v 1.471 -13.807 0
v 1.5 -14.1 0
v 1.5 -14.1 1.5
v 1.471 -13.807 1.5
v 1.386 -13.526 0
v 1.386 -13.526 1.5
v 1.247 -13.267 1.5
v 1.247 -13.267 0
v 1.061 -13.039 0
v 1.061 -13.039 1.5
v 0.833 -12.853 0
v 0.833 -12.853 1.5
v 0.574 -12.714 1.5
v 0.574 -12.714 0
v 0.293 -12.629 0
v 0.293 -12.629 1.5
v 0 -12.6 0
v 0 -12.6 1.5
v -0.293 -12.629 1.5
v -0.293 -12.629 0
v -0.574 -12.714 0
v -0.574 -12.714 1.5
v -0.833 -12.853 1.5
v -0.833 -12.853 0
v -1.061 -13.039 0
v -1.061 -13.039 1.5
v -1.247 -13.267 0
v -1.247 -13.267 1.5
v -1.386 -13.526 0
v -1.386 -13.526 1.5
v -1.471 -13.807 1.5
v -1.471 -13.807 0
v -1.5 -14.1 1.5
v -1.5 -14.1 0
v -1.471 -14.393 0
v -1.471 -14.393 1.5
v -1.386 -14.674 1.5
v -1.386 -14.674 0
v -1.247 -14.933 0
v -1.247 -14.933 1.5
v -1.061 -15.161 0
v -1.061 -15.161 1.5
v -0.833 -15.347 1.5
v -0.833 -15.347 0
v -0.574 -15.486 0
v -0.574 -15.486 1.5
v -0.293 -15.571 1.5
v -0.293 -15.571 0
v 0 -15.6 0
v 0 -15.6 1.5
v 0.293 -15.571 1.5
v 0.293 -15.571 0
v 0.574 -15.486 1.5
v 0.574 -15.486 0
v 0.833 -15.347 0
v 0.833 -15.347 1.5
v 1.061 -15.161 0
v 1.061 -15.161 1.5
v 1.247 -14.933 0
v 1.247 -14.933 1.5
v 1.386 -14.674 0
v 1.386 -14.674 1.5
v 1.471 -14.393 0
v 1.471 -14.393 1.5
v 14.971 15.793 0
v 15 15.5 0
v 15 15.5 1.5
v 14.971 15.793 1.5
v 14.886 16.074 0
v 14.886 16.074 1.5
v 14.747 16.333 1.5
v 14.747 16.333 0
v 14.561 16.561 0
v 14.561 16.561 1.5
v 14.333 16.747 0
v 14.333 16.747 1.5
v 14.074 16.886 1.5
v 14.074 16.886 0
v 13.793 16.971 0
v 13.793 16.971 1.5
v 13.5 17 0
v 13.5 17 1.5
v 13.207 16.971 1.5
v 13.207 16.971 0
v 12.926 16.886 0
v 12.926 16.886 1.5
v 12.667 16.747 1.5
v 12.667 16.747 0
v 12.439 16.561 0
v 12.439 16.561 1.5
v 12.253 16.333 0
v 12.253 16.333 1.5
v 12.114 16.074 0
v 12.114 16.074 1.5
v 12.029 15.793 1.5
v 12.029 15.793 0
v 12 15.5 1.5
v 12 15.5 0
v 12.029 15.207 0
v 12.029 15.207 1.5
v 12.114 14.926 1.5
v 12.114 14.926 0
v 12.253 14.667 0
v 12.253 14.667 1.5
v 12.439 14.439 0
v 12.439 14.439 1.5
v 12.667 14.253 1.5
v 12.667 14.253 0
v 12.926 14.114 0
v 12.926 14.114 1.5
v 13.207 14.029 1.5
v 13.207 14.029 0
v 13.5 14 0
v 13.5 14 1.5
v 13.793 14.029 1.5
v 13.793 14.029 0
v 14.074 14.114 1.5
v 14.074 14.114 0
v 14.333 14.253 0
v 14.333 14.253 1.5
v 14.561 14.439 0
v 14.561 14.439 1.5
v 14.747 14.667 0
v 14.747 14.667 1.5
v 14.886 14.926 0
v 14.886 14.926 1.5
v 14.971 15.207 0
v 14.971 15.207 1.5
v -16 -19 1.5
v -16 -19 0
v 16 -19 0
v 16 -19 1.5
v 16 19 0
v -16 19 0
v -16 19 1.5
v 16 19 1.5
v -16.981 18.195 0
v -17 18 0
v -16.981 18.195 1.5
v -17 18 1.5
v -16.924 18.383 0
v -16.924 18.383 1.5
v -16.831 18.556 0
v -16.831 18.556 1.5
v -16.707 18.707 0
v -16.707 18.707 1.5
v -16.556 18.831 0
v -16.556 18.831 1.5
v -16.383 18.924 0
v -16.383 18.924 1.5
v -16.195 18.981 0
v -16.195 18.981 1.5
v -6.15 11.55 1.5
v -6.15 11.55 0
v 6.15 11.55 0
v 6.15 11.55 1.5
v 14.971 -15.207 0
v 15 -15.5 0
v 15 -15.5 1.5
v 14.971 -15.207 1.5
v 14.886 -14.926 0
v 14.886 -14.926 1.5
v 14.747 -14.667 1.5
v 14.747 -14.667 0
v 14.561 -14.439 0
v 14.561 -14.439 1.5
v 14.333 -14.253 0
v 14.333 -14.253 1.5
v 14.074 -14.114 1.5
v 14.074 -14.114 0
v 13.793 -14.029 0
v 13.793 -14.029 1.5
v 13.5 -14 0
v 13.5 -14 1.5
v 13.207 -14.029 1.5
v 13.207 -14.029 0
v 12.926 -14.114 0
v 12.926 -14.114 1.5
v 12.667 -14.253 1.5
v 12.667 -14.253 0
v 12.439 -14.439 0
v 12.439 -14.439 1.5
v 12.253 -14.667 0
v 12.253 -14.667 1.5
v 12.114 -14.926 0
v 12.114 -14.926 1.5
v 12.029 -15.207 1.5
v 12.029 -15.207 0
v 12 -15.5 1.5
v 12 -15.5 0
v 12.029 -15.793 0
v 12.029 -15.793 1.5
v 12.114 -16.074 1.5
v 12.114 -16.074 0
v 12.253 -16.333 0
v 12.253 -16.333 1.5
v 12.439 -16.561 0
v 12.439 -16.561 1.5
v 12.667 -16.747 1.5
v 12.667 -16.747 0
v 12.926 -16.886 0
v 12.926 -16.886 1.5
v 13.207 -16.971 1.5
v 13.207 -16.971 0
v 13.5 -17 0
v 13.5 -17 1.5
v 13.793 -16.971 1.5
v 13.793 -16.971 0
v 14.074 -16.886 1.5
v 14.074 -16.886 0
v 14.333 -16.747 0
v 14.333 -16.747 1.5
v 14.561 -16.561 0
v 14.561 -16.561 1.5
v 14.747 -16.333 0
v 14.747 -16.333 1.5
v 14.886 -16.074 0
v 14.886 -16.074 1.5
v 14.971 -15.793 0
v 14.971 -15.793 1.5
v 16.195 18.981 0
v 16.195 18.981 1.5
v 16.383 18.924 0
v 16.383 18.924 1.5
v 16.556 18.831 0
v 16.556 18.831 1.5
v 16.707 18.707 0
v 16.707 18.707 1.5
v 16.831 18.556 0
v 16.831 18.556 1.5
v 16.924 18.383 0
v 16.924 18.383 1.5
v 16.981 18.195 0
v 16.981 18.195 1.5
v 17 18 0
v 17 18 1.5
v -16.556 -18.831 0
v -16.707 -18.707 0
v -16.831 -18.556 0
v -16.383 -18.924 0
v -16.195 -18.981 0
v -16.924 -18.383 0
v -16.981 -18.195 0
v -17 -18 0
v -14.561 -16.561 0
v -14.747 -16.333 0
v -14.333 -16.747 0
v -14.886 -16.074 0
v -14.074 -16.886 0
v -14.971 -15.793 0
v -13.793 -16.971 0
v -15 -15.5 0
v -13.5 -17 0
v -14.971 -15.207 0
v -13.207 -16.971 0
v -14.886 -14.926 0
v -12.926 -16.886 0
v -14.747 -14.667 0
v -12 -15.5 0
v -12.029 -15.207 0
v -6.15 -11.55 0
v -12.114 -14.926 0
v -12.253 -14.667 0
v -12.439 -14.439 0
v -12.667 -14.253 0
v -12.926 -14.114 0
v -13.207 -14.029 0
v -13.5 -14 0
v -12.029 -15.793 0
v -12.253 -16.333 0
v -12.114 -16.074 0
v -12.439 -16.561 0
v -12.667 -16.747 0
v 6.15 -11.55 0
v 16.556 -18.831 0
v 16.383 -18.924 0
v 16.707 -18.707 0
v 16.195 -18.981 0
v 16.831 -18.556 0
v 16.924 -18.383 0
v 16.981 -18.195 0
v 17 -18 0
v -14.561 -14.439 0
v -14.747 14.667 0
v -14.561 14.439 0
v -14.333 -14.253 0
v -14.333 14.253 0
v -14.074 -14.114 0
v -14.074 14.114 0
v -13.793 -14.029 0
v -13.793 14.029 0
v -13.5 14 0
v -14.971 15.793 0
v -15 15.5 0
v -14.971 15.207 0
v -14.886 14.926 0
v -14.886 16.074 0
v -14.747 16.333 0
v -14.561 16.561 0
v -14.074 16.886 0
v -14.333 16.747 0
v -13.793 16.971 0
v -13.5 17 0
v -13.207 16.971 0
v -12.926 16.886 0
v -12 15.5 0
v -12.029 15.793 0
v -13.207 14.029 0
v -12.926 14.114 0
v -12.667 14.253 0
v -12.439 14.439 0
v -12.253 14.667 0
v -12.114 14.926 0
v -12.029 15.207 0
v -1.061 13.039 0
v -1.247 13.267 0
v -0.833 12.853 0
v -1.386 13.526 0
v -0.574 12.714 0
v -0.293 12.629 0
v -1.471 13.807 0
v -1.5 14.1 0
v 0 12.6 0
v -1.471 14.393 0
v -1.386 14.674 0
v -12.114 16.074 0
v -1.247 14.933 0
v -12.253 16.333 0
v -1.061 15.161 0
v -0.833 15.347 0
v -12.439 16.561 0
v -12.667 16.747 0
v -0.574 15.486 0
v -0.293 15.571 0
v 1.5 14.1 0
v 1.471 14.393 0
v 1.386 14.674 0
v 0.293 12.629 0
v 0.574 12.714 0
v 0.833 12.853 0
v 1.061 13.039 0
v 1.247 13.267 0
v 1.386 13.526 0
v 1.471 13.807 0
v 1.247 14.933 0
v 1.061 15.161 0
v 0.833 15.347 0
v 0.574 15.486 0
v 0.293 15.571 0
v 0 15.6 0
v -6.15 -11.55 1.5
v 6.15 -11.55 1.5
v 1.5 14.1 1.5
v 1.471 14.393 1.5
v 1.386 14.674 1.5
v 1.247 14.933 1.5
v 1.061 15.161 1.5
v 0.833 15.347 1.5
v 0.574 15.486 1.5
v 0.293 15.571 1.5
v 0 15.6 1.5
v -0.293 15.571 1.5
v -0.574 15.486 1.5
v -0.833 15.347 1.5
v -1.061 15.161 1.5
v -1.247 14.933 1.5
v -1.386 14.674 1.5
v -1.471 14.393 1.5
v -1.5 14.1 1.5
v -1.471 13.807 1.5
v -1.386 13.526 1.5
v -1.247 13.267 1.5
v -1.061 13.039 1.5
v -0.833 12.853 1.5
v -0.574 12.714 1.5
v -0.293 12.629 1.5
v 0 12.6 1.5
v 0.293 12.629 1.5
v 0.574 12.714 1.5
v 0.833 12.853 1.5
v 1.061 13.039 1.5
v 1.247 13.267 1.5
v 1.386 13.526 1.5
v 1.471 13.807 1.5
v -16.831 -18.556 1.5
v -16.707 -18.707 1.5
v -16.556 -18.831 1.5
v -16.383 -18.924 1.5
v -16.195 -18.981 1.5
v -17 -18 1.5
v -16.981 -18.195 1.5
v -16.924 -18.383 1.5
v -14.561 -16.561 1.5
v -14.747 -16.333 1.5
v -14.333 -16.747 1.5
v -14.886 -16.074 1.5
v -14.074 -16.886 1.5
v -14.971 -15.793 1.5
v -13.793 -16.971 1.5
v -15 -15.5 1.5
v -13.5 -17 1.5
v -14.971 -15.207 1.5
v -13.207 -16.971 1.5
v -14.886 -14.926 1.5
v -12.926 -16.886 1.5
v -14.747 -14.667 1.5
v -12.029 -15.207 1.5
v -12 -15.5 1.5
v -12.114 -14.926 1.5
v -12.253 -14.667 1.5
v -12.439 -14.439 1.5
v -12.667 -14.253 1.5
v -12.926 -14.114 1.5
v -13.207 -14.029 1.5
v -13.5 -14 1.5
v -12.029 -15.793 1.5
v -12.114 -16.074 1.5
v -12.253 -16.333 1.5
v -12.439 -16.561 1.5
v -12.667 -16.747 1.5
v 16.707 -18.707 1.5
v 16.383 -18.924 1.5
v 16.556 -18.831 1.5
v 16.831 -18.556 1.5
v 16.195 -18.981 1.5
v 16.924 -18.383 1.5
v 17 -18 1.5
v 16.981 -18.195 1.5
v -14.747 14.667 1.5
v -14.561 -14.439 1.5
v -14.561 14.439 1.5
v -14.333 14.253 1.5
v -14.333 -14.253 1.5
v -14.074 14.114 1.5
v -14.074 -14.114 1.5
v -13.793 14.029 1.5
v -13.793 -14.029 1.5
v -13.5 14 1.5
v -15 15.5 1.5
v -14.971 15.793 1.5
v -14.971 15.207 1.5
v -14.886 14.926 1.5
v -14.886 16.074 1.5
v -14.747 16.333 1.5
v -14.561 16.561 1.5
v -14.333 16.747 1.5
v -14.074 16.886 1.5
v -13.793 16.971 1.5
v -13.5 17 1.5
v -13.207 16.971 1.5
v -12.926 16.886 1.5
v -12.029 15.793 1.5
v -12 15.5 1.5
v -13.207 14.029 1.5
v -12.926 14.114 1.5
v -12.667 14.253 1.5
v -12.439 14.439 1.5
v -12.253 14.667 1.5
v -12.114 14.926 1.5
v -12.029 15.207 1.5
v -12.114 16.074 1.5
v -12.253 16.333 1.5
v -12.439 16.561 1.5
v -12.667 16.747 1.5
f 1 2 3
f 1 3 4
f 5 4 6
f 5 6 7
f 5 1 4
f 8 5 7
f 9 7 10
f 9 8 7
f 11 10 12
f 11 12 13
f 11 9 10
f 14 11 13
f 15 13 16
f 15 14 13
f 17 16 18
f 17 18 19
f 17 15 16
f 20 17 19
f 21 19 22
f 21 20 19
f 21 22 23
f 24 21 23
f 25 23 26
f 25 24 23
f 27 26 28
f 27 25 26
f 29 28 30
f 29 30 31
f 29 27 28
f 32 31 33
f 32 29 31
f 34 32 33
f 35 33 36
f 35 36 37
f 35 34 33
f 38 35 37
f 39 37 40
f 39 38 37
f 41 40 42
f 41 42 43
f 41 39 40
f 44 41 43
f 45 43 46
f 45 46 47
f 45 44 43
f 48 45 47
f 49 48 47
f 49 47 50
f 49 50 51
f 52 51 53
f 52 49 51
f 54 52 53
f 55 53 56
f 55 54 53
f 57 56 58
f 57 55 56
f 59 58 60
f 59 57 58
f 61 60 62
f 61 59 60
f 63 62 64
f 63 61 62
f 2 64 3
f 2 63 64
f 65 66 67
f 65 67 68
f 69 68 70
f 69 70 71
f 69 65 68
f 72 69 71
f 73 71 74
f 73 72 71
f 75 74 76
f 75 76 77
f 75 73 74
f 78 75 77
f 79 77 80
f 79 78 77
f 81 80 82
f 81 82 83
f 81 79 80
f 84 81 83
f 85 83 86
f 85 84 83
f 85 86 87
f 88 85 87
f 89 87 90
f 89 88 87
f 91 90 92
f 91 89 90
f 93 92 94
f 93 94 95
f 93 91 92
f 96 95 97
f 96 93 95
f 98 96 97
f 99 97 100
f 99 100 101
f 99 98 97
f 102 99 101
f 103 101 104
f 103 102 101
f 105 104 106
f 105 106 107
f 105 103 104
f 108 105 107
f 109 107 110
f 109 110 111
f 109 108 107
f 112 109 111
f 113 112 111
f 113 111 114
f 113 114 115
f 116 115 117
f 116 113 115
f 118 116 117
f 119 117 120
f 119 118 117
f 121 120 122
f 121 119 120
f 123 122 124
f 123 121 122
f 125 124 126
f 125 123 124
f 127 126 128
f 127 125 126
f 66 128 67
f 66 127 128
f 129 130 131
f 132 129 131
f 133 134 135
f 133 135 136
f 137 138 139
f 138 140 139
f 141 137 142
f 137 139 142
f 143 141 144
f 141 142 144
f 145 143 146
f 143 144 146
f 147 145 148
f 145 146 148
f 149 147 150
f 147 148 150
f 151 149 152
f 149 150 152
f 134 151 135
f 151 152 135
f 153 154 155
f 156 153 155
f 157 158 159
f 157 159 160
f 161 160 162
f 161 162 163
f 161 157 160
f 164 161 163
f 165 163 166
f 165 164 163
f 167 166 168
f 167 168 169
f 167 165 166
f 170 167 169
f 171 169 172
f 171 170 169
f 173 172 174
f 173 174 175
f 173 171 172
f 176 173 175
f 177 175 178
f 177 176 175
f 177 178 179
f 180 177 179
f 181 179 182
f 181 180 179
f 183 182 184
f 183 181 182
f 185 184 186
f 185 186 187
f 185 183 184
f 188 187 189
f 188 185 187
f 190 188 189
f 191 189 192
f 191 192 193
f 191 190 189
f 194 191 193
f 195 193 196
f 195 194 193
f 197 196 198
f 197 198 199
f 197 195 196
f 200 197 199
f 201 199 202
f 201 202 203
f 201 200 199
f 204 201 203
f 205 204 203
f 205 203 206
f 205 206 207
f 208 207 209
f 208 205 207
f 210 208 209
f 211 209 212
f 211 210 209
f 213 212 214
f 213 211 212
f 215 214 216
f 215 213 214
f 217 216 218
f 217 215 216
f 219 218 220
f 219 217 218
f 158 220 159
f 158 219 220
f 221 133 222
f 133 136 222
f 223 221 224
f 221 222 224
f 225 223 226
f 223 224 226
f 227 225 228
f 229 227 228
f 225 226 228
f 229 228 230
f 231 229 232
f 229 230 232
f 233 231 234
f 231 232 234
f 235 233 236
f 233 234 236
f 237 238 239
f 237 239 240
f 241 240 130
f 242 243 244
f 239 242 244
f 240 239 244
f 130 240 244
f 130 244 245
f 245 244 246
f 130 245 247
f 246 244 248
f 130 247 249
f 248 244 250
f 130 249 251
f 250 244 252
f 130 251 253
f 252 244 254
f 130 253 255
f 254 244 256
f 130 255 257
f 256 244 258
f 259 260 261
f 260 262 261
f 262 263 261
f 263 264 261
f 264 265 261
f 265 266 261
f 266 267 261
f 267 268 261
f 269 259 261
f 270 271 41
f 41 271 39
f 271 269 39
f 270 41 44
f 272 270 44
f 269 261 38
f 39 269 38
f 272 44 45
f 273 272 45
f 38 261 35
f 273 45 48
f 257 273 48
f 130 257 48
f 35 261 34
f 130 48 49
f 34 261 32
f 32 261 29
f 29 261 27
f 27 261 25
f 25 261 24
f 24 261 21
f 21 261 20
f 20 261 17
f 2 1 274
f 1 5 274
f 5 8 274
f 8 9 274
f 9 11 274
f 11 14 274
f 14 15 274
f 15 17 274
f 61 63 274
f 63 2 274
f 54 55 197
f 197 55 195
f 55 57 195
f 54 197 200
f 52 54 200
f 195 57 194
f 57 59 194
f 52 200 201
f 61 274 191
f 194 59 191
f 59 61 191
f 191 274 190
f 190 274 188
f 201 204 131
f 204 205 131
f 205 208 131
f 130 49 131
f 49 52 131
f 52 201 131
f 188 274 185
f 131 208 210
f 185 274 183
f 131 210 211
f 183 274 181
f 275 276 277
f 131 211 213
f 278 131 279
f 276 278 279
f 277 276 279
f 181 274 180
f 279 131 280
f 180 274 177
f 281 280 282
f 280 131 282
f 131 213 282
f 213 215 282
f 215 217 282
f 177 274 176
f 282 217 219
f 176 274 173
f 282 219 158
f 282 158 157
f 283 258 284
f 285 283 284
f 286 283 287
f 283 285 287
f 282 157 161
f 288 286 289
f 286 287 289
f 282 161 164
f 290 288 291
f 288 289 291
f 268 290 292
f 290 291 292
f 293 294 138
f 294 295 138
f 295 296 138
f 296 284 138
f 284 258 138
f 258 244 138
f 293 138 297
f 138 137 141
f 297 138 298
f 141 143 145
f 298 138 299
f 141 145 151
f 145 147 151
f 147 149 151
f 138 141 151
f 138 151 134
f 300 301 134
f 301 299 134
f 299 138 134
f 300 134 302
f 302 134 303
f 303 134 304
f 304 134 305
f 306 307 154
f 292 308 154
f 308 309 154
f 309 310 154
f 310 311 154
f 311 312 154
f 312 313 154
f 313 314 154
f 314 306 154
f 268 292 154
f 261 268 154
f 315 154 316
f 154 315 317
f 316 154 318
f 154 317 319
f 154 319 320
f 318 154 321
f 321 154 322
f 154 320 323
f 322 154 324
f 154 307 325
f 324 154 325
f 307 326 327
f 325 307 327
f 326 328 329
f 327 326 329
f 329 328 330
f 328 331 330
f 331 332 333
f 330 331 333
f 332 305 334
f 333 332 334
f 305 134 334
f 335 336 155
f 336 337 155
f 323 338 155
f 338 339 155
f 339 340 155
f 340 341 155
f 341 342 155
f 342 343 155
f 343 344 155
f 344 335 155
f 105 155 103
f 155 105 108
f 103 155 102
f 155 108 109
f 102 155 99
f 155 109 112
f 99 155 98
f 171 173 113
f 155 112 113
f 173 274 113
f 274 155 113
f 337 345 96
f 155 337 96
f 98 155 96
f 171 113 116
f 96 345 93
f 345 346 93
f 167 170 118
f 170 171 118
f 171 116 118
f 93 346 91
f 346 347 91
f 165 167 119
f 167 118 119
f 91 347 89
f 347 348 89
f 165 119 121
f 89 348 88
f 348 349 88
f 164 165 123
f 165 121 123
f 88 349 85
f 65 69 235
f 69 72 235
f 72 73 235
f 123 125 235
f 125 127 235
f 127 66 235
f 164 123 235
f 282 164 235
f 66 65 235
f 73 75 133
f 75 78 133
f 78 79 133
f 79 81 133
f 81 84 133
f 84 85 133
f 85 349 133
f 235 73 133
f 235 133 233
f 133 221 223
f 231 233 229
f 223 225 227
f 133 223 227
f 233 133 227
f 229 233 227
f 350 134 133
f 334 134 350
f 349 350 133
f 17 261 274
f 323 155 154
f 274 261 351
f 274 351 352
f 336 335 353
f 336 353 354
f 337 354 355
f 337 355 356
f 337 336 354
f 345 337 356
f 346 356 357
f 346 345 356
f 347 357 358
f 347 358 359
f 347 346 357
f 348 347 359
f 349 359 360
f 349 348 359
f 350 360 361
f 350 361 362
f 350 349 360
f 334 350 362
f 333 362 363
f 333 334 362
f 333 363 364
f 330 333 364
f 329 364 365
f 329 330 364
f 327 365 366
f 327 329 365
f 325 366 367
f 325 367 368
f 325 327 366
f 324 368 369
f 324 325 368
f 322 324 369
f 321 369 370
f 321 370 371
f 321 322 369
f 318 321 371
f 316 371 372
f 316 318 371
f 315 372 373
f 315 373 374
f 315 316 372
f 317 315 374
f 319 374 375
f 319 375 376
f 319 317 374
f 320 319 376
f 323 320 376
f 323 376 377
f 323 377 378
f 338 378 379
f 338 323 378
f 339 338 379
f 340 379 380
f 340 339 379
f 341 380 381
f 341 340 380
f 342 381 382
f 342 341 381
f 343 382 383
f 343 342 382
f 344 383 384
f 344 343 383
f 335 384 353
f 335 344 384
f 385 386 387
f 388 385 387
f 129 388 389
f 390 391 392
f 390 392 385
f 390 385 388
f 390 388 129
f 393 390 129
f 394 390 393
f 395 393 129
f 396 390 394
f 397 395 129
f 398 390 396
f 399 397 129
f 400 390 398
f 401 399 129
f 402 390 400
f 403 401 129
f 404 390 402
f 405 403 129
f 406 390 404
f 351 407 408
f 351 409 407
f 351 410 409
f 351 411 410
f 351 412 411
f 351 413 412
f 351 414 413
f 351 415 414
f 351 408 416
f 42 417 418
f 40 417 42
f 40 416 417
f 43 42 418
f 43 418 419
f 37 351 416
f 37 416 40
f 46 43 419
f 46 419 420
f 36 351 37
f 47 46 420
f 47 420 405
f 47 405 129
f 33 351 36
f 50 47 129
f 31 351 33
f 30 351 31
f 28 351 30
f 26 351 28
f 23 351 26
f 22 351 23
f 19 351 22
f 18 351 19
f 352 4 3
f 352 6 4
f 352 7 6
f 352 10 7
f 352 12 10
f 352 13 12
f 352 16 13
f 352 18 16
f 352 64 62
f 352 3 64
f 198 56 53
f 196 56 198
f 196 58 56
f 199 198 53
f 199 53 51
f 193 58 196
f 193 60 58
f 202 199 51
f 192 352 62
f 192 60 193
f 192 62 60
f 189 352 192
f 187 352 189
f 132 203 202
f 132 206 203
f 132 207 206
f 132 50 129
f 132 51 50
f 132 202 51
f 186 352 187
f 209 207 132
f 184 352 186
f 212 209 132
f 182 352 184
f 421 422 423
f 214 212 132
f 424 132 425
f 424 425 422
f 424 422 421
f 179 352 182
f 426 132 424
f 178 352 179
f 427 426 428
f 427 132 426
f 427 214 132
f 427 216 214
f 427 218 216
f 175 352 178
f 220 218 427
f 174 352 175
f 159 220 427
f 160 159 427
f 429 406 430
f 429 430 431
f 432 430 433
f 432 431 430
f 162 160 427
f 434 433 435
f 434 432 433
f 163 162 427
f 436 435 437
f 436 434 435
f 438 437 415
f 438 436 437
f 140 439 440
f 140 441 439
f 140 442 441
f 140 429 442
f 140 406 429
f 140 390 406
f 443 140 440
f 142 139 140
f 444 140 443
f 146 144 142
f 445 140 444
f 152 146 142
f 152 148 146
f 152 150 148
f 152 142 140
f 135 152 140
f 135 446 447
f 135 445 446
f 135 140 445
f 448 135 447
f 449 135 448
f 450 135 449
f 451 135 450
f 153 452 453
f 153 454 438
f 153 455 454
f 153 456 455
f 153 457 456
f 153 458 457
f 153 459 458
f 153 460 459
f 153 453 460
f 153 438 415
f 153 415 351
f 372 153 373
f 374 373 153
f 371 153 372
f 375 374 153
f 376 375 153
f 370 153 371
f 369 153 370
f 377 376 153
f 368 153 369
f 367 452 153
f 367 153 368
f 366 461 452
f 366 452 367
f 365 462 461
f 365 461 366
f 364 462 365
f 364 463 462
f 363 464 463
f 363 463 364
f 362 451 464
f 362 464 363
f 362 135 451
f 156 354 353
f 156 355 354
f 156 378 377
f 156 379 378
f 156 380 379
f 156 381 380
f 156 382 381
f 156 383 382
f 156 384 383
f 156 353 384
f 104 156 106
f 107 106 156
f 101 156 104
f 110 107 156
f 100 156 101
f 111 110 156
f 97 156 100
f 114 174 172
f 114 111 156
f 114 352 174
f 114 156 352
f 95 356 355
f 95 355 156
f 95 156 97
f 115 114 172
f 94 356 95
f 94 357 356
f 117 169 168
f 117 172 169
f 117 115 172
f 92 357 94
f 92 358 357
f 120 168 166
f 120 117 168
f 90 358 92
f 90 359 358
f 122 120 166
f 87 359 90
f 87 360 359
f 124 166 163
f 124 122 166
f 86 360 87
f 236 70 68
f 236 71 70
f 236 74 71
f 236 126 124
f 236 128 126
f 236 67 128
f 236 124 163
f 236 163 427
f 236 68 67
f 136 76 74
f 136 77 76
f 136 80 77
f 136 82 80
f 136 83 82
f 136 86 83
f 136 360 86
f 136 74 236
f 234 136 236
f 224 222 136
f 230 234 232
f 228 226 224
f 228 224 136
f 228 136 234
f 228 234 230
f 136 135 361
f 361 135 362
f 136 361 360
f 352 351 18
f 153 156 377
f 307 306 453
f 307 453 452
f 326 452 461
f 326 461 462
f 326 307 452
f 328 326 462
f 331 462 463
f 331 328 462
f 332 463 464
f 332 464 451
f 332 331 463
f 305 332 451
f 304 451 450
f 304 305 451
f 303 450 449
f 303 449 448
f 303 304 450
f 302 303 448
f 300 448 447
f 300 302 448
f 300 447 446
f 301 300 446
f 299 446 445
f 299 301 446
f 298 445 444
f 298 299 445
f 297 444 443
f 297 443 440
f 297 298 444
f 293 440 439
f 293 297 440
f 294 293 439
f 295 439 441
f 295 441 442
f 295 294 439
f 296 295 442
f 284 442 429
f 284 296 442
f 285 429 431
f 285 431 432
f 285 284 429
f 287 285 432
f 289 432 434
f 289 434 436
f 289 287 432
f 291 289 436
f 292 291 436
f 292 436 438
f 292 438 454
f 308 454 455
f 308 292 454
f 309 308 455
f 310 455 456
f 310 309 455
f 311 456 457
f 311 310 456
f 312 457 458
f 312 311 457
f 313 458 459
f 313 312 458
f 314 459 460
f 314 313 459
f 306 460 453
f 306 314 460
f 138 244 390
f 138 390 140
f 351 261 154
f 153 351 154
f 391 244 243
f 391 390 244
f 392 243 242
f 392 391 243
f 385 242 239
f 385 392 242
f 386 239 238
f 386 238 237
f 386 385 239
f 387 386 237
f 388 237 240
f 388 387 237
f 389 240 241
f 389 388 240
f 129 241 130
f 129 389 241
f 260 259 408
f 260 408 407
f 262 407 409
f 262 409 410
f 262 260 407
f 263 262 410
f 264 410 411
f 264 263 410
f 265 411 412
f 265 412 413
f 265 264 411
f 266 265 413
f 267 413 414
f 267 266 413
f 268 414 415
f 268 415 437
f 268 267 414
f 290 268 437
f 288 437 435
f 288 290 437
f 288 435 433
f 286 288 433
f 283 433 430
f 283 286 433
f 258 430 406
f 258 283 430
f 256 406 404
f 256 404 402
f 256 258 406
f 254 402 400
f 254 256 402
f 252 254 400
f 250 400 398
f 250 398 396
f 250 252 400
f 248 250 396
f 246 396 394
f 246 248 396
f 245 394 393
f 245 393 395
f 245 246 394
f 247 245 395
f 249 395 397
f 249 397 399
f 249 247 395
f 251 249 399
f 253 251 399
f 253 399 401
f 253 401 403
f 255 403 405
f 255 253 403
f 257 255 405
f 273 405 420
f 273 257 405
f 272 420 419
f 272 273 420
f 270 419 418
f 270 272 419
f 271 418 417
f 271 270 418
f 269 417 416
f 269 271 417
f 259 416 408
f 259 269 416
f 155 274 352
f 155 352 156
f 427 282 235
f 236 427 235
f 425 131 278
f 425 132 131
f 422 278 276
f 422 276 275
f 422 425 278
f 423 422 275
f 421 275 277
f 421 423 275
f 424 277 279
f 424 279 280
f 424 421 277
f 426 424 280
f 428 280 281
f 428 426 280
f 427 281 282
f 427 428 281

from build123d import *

# Parameters (mm, degrees)
SKETCH001_W   = 34
SKETCH001_H   = 38
SKETCH001_R   = 1.5
SKETCH001_W_2 = 12.3
SKETCH001_H_2 = 23.1
EXTRUDE_DEPTH = 1.5
FILLET_R      = 1


with BuildPart() as part:
    # Sketch001 → Extrude (new body)
    with BuildSketch(Plane.XY):
        Rectangle(SKETCH001_W, SKETCH001_H)
        with Locations((0, 14.1)):
            Circle(SKETCH001_R, mode=Mode.SUBTRACT)
        with Locations((0, -14.1)):
            Circle(SKETCH001_R, mode=Mode.SUBTRACT)
        with Locations((13.5, 15.5)):
            Circle(SKETCH001_R, mode=Mode.SUBTRACT)
        with Locations((-13.5, 15.5)):
            Circle(SKETCH001_R, mode=Mode.SUBTRACT)
        with Locations((-13.5, -15.5)):
            Circle(SKETCH001_R, mode=Mode.SUBTRACT)
        with Locations((13.5, -15.5)):
            Circle(SKETCH001_R, mode=Mode.SUBTRACT)
        Rectangle(SKETCH001_W_2, SKETCH001_H_2, mode=Mode.SUBTRACT)
    extrude(amount=EXTRUDE_DEPTH)

    # Fillet
    fillet_edges = [part.edges().sort_by_distance(p)[0] for p in [
        (-17, 19, 0.75),
        (17, 19, 0.75),
        (17, -19, 0.75),
        (-17, -19, 0.75),
    ]]
    fillet(fillet_edges, radius=FILLET_R)


solid = part.part
